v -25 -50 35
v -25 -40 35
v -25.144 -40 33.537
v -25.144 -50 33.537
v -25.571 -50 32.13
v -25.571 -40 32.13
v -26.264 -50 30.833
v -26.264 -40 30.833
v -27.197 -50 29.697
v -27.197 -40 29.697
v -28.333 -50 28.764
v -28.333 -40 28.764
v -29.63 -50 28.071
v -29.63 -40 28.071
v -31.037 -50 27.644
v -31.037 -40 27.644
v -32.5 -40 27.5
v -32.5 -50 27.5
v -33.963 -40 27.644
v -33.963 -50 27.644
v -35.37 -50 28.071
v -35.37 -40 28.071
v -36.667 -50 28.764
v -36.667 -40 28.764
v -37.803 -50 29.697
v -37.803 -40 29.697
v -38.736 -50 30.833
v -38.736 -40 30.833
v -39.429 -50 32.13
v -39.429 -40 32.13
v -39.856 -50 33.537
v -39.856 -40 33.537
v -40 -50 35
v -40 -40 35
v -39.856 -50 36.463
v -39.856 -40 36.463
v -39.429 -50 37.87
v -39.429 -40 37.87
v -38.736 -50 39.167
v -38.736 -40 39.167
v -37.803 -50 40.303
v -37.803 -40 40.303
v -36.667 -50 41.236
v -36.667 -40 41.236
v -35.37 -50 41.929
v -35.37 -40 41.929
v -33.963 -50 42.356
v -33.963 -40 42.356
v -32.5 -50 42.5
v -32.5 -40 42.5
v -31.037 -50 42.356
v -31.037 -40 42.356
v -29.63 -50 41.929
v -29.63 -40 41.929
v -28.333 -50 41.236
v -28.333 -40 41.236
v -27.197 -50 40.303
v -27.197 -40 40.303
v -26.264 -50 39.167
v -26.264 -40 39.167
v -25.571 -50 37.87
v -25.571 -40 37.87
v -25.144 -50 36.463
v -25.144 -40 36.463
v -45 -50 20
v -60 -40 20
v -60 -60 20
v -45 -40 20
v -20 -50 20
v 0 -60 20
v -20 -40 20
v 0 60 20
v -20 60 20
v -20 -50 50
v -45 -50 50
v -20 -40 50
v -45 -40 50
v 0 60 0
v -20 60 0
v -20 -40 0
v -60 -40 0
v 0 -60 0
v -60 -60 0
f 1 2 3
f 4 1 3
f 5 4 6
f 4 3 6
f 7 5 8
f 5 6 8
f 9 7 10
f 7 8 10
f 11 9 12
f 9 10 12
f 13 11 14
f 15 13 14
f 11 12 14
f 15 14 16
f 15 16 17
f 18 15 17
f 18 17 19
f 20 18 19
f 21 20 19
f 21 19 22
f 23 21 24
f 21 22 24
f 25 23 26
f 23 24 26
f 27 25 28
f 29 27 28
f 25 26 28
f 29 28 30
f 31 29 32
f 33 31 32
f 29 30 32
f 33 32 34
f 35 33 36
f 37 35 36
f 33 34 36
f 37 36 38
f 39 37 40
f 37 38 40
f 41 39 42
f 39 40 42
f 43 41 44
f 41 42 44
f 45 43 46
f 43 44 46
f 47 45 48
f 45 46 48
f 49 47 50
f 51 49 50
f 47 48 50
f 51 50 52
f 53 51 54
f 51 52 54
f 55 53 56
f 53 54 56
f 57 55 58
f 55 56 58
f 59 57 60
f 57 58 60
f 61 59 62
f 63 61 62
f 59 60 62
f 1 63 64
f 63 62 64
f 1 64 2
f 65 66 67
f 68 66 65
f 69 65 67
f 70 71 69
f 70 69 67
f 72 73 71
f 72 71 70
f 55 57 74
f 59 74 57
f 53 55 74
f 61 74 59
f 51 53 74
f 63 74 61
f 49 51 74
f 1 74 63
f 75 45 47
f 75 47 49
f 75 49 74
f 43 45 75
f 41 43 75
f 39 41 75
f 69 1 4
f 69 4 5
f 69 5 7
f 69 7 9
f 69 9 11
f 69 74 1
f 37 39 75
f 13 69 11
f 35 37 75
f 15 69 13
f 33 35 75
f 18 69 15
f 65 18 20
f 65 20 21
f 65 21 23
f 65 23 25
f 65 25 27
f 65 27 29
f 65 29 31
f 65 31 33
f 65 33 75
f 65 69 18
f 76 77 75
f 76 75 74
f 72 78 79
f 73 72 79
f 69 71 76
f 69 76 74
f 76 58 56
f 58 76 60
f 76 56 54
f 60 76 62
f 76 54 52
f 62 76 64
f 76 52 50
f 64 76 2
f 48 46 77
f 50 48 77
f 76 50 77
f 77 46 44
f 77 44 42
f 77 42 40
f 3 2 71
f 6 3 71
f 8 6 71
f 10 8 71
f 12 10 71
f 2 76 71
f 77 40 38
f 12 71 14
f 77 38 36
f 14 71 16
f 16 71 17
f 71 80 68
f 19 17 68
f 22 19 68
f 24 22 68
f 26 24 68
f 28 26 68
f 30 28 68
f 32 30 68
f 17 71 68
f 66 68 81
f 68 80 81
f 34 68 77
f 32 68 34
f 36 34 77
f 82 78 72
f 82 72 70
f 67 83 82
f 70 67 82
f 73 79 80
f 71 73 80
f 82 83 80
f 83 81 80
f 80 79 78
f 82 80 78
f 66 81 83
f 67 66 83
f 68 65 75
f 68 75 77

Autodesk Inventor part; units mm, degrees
ref_plane "YZ Plane" through (0, 0, 0) normal (1, 0, 0) x (0, 1, 0)
ref_plane "XZ Plane" through (0, 0, 0) normal (0, 1, 0) x (-1, 0, 0)
ref_plane "XY Plane" through (0, 0, 0) normal (0, 0, 1) x (1, 0, 0)
sketch "Sketch1" plane through (0, 0, 0) normal (0, 0, 1) x (1, 0, 0)
  line L0 (0, 60) -> (0, -60)
  line L1 (0, 60) -> (-20, 60)
  line L2 (-20, 60) -> (-20, -40)
  line L3 (-20, -40) -> (-60, -40)
  line L4 (-60, -40) -> (-60, -60)
  line L5 (-60, -60) -> (0, -60)
  point P0 (0, 0)
  dimension "d0" = 120
  dimension "d1" = 20
  dimension "d2" = 100
  dimension "d3" = 40
  dimension "d4" = 20
extrude "Extrusion1" add sketch "Sketch1" along normal blind 20
sketch "Sketch2" plane through (0, 0, 20) normal (0, 0, 1) x (1, 0, 0)
  line L0 (-20, -40) -> (-60, -40) projected
  line L1 (-20, -40) -> (-20, -50)
  line L2 (-20, -50) -> (-45, -50)
  line L3 (-45, -50) -> (-45, -40)
  point P0 (0, 0)
  dimension "d7" = 10
  dimension "d8" = 25
extrude "Extrusion2" add sketch "Sketch2" along normal blind 30
sketch "Sketch3" plane through (-60, -40, 0) normal (0, 1, 0) x (1, 0, 0)
  point P0 (60, 0)
sketch "Sketch4" plane through (-60, -40, 0) normal (0, 1, 0) x (1, 0, 0)
  line L0 (40, -50) -> (15, -50) projected
  line L1 (40, -20) -> (40, -50) projected
  circle A0 centre (27.5, -35) radius 7.5
  point P0 (60, 0)
  dimension "d11" = 15
extrude "Extrusion3" cut sketch "Sketch4" against normal blind 10
properties part number "steering_helper_base[1]"
